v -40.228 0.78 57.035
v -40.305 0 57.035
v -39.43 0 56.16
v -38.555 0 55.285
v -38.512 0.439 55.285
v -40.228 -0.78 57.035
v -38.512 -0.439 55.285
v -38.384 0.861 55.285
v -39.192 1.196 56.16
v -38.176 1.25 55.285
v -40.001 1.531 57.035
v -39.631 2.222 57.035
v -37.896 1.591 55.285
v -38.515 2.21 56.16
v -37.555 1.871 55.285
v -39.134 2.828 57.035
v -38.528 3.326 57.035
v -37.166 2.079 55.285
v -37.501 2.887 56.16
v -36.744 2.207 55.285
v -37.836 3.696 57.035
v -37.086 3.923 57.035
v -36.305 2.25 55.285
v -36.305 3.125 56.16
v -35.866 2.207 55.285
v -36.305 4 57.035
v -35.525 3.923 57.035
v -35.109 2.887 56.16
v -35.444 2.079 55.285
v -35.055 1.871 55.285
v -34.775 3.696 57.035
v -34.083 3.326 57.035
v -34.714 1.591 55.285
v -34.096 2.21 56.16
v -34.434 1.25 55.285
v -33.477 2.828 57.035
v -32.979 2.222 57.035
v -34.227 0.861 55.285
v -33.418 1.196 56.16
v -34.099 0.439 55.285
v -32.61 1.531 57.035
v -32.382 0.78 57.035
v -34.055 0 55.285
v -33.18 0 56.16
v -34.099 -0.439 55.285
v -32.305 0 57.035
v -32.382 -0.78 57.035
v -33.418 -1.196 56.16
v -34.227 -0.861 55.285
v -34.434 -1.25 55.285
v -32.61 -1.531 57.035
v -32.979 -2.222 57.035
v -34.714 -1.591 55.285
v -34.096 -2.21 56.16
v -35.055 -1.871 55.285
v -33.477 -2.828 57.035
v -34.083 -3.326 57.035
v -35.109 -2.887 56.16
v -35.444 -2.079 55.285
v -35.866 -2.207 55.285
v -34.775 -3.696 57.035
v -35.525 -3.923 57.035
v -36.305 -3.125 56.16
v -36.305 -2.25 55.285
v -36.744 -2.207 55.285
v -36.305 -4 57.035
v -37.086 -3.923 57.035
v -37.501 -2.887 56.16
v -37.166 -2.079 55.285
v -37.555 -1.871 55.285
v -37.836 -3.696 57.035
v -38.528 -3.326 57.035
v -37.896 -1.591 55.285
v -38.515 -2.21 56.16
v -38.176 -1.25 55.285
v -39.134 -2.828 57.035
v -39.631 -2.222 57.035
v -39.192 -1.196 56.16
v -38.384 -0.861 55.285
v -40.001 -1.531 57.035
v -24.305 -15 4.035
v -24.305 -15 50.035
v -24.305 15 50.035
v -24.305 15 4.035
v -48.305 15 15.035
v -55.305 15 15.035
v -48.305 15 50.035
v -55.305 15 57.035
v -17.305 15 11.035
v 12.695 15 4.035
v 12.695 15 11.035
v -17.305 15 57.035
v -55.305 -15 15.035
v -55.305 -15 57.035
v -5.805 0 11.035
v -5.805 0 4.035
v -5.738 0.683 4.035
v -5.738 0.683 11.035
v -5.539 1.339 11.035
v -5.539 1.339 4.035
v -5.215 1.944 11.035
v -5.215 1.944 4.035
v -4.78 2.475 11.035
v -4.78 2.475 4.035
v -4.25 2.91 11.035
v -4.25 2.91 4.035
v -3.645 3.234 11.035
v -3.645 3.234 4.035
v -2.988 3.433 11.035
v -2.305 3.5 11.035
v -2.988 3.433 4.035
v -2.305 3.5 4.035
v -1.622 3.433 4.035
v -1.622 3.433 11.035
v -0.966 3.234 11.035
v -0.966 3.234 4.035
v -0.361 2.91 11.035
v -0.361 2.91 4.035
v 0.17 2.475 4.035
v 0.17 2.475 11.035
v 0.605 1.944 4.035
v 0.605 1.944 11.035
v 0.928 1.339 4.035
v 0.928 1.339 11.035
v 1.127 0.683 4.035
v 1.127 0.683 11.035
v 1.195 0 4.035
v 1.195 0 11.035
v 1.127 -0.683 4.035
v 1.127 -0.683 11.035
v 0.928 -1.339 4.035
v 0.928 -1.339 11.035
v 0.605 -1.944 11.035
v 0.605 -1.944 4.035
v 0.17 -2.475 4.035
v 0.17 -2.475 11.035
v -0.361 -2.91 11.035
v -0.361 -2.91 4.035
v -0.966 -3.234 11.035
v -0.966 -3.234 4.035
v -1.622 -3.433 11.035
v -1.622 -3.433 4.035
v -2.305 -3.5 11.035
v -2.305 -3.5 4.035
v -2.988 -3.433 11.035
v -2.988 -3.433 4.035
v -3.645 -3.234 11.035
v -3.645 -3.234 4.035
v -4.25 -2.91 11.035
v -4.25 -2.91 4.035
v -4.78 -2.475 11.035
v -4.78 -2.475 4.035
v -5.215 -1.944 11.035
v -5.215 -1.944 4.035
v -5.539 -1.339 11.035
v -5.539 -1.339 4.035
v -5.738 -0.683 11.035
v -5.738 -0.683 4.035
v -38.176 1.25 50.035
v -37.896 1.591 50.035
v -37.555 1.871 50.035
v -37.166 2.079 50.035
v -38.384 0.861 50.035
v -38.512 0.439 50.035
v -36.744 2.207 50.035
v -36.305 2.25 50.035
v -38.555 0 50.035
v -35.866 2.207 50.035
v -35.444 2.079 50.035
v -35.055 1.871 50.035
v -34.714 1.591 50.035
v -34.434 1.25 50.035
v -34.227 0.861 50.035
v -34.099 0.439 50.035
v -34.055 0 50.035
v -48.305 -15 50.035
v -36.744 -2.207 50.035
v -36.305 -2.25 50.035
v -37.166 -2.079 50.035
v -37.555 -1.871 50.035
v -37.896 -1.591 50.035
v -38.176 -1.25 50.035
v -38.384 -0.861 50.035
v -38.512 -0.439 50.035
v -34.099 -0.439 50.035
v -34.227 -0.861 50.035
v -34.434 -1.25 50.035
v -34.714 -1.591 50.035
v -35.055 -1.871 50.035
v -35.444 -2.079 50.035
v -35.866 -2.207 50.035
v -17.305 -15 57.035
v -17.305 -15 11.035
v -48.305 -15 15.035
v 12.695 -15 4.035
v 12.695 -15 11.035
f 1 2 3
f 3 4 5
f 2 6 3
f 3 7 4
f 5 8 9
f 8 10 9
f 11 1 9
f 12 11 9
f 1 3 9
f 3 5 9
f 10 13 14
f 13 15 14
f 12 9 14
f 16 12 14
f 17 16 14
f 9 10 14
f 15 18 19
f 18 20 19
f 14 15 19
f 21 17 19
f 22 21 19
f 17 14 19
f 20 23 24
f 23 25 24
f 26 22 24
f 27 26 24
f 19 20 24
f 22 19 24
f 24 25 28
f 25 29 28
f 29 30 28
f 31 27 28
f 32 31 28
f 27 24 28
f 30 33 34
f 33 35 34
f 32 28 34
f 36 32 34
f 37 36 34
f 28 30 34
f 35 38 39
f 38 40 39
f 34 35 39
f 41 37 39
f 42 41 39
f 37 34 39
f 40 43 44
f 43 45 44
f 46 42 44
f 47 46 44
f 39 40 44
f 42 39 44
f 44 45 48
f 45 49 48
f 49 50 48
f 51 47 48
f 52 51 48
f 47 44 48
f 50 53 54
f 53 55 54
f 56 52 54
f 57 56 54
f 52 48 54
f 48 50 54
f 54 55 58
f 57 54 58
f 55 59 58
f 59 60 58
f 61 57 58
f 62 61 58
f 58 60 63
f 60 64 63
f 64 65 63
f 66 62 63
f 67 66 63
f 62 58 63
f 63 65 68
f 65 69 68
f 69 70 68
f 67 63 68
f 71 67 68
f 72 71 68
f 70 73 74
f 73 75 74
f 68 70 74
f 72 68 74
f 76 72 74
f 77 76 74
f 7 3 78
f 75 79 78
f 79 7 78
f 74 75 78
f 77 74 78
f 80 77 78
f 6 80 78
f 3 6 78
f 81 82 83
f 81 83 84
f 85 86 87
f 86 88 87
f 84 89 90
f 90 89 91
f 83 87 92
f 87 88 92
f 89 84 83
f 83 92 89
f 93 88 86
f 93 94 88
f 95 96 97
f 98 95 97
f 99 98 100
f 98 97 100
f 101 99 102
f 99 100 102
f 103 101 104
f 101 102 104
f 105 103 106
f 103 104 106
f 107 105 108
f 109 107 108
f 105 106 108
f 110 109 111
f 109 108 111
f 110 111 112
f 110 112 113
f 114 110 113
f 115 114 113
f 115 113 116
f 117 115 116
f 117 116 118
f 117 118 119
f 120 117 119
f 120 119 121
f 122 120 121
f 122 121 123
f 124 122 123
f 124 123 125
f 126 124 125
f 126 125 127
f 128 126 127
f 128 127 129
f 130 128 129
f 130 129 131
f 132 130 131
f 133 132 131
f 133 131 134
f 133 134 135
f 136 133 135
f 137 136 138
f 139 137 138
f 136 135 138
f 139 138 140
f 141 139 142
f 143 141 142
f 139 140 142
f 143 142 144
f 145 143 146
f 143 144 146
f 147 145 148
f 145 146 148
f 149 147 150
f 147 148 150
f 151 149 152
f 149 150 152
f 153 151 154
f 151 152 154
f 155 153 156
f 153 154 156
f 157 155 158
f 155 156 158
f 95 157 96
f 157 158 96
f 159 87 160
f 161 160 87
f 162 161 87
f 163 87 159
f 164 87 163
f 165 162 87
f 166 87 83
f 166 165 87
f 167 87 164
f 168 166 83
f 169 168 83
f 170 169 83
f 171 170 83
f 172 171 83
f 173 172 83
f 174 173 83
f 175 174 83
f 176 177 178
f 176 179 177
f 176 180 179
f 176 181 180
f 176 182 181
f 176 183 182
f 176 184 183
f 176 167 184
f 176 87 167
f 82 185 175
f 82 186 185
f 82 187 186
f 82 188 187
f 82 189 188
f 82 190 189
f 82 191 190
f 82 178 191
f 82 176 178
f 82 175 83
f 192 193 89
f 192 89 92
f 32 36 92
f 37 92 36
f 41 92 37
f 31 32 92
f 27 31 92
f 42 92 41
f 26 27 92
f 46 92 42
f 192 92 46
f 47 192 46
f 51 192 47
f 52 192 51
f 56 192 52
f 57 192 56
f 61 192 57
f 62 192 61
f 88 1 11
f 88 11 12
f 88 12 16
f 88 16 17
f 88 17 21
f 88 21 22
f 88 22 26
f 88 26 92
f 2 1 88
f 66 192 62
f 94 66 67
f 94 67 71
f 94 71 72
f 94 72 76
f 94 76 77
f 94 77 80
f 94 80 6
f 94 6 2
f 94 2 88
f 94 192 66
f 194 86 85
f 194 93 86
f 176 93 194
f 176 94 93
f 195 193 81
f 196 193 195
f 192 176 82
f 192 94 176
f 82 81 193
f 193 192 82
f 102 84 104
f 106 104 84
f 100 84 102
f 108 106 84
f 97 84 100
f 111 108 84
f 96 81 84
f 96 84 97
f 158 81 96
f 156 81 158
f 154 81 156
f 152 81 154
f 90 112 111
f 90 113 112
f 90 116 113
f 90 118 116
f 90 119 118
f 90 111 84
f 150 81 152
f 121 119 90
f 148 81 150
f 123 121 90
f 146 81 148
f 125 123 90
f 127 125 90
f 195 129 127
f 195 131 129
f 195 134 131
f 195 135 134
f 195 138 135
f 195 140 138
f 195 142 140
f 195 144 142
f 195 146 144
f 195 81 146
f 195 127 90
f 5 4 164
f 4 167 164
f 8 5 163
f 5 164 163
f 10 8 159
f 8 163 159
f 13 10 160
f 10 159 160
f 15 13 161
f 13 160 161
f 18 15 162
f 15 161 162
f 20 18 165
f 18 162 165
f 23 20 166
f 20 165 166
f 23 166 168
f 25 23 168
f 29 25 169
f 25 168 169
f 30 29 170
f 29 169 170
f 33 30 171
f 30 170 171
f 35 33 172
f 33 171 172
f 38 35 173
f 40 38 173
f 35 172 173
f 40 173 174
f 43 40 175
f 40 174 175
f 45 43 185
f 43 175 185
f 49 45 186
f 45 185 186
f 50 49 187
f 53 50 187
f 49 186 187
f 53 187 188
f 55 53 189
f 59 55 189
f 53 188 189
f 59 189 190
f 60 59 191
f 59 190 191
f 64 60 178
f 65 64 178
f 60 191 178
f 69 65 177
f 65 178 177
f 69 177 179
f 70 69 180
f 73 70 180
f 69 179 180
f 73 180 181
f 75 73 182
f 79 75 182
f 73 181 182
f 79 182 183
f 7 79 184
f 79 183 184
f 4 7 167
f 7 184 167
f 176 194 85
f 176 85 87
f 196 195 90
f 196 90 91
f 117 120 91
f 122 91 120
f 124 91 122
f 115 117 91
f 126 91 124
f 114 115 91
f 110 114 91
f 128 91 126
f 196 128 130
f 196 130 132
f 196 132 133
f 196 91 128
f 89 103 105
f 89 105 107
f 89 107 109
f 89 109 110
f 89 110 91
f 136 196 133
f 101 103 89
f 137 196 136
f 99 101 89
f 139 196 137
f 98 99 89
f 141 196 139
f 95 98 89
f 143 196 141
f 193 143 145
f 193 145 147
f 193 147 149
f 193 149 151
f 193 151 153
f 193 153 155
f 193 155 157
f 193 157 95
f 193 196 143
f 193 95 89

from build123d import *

# Parameters (mm, degrees)
F1_DEPTH       = 15
F3_D           = 7
F5_D           = 4.5
F5_CSINK_D     = 8
F5_CSINK_ANGLE = 90


with BuildPart() as f1:
    # F0 (on Front) → F1 (new body, symmetric)
    with BuildSketch(Plane.XZ):
        Polygon((-55.305267, 15.034918), (-48.305267, 15.034918), (-48.305267, 50.034918), (-24.305267, 50.034918), (-24.305267, 4.034918), (12.694733, 4.034918), (12.694733, 11.034918), (-17.305267, 11.034918), (-17.305267, 57.034918), (-55.305267, 57.034918), align=None)
    extrude(amount=F1_DEPTH, both=True)

    # F3 (through all)
    with Locations(Plane.XY.offset(11.034918)):
        with Locations((-2.305267, 0)):
            Hole(F3_D / 2)

    # F5 (through all)
    with Locations(Plane.XY.offset(57.034918)):
        with Locations((-36.305267, 0)):
            CounterSinkHole(F5_D / 2, F5_CSINK_D / 2, counter_sink_angle=F5_CSINK_ANGLE)


solid = f1.part
